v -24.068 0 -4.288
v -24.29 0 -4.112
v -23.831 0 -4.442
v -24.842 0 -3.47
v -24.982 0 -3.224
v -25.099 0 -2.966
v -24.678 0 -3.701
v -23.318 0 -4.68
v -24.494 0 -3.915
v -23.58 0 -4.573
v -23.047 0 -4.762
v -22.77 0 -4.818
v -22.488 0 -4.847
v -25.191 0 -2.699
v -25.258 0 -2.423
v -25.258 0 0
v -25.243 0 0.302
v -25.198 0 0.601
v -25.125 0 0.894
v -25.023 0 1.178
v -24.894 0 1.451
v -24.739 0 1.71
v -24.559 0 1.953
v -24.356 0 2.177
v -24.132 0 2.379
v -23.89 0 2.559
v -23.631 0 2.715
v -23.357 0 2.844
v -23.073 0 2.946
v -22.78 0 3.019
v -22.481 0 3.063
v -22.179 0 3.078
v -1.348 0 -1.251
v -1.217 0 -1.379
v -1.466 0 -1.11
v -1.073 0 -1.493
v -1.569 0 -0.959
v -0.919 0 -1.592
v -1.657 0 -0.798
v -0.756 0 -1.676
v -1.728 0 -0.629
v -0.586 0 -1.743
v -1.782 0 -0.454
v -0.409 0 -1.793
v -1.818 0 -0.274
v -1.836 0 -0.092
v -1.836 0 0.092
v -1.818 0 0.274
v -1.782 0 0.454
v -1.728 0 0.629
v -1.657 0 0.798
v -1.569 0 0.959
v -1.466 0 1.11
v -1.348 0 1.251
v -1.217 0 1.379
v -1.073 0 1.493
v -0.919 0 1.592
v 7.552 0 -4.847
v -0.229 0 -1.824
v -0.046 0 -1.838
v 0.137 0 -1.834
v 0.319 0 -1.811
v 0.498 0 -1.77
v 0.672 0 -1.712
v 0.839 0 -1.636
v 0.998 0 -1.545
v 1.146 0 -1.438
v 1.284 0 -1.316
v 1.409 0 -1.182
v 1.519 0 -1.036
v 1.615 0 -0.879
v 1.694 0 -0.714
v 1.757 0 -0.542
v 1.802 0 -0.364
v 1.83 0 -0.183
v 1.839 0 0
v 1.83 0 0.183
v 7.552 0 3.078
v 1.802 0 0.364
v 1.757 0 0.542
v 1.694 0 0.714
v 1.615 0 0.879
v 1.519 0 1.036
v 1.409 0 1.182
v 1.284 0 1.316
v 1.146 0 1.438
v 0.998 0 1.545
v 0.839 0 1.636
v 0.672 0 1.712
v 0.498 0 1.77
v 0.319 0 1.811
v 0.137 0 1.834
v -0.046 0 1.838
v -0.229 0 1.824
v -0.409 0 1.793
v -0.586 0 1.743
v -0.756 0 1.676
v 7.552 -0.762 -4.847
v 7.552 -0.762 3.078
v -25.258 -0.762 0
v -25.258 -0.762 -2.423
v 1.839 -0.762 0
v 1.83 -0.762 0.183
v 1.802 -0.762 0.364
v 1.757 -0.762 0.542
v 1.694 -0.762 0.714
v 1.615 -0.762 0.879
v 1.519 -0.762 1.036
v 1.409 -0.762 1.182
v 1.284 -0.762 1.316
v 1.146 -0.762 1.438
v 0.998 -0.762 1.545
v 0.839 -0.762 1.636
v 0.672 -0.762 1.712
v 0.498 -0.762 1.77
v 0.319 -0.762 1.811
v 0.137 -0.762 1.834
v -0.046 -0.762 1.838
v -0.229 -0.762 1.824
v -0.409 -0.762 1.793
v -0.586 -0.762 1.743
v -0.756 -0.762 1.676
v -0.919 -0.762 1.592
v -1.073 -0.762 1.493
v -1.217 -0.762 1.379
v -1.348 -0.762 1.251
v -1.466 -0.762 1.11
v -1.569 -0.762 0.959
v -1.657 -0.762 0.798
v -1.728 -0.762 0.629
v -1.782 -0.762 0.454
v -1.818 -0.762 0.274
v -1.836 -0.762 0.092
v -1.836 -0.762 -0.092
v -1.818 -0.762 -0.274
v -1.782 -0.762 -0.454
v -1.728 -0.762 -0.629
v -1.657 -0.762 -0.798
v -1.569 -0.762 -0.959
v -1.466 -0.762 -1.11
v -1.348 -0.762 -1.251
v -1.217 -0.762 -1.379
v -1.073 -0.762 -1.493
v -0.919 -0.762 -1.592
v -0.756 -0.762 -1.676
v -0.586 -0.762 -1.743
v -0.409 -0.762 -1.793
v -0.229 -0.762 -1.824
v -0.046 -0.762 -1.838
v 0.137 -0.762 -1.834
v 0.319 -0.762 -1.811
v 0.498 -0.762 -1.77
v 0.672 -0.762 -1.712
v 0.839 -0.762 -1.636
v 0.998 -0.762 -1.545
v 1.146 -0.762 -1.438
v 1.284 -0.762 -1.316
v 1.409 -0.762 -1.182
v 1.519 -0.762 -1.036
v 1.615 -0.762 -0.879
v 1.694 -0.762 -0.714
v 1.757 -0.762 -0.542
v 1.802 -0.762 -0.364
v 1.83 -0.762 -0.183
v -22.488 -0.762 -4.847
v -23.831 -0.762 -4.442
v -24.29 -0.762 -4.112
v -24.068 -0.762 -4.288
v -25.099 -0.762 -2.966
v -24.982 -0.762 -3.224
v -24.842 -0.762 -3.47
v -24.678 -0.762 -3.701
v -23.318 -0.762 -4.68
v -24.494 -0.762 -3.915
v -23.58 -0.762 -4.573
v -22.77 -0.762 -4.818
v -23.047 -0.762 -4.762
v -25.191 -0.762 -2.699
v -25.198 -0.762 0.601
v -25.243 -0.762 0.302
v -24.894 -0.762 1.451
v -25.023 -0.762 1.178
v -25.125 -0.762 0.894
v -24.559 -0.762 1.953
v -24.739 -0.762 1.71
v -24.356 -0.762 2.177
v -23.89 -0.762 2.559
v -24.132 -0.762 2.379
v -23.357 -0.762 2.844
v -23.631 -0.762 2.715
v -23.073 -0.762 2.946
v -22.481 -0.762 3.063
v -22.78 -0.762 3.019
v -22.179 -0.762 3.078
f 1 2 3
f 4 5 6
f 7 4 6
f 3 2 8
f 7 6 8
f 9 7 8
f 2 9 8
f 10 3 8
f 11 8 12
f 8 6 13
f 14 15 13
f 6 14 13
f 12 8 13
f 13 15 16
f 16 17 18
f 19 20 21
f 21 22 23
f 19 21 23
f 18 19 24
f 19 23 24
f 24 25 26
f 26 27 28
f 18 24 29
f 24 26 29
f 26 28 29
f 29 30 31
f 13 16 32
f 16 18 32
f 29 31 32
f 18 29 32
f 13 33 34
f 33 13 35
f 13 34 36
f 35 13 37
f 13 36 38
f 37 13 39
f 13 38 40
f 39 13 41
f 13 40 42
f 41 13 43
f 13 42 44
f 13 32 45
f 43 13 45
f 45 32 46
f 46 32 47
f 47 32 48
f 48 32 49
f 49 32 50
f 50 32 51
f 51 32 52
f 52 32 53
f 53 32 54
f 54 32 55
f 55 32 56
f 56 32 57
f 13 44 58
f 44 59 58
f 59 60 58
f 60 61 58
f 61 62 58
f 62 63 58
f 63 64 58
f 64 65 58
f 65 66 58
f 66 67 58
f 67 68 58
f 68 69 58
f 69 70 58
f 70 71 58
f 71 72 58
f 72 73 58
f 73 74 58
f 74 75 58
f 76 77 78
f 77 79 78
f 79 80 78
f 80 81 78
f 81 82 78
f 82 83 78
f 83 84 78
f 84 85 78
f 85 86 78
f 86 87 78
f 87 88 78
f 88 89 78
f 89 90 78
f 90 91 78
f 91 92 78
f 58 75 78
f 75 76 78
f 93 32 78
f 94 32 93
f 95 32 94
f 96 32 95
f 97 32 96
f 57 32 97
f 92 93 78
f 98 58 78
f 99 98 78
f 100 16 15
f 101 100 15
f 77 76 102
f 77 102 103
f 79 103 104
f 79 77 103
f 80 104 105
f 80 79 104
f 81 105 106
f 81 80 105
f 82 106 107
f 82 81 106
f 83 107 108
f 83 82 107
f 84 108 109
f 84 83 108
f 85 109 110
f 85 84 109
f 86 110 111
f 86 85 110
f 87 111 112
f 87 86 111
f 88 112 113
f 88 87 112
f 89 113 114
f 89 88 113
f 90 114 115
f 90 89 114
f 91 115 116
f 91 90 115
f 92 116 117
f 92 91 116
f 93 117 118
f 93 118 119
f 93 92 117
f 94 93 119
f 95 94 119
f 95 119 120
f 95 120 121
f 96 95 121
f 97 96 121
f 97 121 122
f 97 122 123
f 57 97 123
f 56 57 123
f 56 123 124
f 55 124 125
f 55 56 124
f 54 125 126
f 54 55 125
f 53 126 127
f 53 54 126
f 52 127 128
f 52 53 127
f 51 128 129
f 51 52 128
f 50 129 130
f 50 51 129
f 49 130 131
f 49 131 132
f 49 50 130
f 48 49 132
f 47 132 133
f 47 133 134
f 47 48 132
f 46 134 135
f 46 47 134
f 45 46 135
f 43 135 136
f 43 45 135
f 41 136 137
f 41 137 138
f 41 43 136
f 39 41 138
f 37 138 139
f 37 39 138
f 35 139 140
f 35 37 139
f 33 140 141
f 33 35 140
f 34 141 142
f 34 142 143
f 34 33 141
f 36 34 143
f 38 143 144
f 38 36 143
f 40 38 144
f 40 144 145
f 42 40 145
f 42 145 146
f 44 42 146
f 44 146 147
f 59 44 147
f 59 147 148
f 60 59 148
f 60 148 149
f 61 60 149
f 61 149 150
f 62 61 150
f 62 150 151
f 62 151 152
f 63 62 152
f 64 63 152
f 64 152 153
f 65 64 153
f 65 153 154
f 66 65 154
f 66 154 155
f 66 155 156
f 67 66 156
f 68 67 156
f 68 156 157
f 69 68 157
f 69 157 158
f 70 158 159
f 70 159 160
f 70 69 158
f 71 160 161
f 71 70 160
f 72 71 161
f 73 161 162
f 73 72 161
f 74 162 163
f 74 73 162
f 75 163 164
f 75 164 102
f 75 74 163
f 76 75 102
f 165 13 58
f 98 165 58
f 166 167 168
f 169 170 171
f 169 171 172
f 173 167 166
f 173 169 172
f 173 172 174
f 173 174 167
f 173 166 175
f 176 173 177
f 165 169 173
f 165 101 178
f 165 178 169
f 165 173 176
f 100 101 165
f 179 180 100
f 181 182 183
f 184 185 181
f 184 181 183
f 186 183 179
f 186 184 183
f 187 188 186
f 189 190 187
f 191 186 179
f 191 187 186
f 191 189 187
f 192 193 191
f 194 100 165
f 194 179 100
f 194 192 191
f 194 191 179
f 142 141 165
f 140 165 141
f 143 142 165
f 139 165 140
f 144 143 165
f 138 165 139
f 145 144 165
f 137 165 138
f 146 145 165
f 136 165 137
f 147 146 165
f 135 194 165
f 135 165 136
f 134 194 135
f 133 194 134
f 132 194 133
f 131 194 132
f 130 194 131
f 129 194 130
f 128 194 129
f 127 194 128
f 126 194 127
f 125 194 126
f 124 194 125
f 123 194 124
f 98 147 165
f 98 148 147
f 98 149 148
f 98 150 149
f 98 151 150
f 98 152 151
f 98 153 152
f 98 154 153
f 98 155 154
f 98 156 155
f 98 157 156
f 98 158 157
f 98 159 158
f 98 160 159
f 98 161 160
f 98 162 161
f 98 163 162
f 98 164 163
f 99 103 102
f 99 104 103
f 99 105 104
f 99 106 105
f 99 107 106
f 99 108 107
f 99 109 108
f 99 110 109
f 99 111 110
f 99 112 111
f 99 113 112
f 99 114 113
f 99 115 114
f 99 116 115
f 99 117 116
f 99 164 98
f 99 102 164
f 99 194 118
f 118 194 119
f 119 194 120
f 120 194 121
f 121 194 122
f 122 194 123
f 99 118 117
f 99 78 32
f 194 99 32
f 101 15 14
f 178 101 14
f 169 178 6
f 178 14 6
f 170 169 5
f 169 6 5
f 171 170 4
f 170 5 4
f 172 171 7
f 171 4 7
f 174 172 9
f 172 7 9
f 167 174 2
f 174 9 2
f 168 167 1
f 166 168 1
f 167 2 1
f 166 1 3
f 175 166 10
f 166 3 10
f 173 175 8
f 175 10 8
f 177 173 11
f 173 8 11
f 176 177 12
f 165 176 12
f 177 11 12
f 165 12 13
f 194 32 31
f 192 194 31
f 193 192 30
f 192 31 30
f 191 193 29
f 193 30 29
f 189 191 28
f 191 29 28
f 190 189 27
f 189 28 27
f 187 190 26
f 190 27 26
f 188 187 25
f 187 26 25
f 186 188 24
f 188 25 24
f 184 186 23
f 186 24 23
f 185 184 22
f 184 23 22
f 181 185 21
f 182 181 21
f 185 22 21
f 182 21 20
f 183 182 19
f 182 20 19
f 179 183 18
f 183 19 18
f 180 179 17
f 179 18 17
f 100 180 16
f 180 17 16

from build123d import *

# Parameters (mm, degrees)
F0_R     = 1.838713
F1_DEPTH = 0.762


with BuildPart() as f1:
    # F0 (on Front) → F1 (new body)
    with BuildSketch(Plane.XZ):
        with BuildLine():
            Line((7.552237, 3.078119), (-22.179499, 3.078119))
            ThreePointArc((-22.179499, 3.078119), (-24.356058, 2.176559), (-25.257618, 0))
            Line((-25.257618, 0), (-25.257618, -2.423407))
            ThreePointArc((-25.257618, -2.423407), (-24.289763, -4.111575), (-22.488076, -4.846813))
            Line((-22.488076, -4.846813), (-22.152904, -4.846813))
            Line((-22.152904, -4.846813), (7.552237, -4.846813))
            Line((7.552237, -4.846813), (7.552237, 3.078119))
        make_face()
        Circle(F0_R, mode=Mode.SUBTRACT)
    extrude(amount=F1_DEPTH)


solid = f1.part
